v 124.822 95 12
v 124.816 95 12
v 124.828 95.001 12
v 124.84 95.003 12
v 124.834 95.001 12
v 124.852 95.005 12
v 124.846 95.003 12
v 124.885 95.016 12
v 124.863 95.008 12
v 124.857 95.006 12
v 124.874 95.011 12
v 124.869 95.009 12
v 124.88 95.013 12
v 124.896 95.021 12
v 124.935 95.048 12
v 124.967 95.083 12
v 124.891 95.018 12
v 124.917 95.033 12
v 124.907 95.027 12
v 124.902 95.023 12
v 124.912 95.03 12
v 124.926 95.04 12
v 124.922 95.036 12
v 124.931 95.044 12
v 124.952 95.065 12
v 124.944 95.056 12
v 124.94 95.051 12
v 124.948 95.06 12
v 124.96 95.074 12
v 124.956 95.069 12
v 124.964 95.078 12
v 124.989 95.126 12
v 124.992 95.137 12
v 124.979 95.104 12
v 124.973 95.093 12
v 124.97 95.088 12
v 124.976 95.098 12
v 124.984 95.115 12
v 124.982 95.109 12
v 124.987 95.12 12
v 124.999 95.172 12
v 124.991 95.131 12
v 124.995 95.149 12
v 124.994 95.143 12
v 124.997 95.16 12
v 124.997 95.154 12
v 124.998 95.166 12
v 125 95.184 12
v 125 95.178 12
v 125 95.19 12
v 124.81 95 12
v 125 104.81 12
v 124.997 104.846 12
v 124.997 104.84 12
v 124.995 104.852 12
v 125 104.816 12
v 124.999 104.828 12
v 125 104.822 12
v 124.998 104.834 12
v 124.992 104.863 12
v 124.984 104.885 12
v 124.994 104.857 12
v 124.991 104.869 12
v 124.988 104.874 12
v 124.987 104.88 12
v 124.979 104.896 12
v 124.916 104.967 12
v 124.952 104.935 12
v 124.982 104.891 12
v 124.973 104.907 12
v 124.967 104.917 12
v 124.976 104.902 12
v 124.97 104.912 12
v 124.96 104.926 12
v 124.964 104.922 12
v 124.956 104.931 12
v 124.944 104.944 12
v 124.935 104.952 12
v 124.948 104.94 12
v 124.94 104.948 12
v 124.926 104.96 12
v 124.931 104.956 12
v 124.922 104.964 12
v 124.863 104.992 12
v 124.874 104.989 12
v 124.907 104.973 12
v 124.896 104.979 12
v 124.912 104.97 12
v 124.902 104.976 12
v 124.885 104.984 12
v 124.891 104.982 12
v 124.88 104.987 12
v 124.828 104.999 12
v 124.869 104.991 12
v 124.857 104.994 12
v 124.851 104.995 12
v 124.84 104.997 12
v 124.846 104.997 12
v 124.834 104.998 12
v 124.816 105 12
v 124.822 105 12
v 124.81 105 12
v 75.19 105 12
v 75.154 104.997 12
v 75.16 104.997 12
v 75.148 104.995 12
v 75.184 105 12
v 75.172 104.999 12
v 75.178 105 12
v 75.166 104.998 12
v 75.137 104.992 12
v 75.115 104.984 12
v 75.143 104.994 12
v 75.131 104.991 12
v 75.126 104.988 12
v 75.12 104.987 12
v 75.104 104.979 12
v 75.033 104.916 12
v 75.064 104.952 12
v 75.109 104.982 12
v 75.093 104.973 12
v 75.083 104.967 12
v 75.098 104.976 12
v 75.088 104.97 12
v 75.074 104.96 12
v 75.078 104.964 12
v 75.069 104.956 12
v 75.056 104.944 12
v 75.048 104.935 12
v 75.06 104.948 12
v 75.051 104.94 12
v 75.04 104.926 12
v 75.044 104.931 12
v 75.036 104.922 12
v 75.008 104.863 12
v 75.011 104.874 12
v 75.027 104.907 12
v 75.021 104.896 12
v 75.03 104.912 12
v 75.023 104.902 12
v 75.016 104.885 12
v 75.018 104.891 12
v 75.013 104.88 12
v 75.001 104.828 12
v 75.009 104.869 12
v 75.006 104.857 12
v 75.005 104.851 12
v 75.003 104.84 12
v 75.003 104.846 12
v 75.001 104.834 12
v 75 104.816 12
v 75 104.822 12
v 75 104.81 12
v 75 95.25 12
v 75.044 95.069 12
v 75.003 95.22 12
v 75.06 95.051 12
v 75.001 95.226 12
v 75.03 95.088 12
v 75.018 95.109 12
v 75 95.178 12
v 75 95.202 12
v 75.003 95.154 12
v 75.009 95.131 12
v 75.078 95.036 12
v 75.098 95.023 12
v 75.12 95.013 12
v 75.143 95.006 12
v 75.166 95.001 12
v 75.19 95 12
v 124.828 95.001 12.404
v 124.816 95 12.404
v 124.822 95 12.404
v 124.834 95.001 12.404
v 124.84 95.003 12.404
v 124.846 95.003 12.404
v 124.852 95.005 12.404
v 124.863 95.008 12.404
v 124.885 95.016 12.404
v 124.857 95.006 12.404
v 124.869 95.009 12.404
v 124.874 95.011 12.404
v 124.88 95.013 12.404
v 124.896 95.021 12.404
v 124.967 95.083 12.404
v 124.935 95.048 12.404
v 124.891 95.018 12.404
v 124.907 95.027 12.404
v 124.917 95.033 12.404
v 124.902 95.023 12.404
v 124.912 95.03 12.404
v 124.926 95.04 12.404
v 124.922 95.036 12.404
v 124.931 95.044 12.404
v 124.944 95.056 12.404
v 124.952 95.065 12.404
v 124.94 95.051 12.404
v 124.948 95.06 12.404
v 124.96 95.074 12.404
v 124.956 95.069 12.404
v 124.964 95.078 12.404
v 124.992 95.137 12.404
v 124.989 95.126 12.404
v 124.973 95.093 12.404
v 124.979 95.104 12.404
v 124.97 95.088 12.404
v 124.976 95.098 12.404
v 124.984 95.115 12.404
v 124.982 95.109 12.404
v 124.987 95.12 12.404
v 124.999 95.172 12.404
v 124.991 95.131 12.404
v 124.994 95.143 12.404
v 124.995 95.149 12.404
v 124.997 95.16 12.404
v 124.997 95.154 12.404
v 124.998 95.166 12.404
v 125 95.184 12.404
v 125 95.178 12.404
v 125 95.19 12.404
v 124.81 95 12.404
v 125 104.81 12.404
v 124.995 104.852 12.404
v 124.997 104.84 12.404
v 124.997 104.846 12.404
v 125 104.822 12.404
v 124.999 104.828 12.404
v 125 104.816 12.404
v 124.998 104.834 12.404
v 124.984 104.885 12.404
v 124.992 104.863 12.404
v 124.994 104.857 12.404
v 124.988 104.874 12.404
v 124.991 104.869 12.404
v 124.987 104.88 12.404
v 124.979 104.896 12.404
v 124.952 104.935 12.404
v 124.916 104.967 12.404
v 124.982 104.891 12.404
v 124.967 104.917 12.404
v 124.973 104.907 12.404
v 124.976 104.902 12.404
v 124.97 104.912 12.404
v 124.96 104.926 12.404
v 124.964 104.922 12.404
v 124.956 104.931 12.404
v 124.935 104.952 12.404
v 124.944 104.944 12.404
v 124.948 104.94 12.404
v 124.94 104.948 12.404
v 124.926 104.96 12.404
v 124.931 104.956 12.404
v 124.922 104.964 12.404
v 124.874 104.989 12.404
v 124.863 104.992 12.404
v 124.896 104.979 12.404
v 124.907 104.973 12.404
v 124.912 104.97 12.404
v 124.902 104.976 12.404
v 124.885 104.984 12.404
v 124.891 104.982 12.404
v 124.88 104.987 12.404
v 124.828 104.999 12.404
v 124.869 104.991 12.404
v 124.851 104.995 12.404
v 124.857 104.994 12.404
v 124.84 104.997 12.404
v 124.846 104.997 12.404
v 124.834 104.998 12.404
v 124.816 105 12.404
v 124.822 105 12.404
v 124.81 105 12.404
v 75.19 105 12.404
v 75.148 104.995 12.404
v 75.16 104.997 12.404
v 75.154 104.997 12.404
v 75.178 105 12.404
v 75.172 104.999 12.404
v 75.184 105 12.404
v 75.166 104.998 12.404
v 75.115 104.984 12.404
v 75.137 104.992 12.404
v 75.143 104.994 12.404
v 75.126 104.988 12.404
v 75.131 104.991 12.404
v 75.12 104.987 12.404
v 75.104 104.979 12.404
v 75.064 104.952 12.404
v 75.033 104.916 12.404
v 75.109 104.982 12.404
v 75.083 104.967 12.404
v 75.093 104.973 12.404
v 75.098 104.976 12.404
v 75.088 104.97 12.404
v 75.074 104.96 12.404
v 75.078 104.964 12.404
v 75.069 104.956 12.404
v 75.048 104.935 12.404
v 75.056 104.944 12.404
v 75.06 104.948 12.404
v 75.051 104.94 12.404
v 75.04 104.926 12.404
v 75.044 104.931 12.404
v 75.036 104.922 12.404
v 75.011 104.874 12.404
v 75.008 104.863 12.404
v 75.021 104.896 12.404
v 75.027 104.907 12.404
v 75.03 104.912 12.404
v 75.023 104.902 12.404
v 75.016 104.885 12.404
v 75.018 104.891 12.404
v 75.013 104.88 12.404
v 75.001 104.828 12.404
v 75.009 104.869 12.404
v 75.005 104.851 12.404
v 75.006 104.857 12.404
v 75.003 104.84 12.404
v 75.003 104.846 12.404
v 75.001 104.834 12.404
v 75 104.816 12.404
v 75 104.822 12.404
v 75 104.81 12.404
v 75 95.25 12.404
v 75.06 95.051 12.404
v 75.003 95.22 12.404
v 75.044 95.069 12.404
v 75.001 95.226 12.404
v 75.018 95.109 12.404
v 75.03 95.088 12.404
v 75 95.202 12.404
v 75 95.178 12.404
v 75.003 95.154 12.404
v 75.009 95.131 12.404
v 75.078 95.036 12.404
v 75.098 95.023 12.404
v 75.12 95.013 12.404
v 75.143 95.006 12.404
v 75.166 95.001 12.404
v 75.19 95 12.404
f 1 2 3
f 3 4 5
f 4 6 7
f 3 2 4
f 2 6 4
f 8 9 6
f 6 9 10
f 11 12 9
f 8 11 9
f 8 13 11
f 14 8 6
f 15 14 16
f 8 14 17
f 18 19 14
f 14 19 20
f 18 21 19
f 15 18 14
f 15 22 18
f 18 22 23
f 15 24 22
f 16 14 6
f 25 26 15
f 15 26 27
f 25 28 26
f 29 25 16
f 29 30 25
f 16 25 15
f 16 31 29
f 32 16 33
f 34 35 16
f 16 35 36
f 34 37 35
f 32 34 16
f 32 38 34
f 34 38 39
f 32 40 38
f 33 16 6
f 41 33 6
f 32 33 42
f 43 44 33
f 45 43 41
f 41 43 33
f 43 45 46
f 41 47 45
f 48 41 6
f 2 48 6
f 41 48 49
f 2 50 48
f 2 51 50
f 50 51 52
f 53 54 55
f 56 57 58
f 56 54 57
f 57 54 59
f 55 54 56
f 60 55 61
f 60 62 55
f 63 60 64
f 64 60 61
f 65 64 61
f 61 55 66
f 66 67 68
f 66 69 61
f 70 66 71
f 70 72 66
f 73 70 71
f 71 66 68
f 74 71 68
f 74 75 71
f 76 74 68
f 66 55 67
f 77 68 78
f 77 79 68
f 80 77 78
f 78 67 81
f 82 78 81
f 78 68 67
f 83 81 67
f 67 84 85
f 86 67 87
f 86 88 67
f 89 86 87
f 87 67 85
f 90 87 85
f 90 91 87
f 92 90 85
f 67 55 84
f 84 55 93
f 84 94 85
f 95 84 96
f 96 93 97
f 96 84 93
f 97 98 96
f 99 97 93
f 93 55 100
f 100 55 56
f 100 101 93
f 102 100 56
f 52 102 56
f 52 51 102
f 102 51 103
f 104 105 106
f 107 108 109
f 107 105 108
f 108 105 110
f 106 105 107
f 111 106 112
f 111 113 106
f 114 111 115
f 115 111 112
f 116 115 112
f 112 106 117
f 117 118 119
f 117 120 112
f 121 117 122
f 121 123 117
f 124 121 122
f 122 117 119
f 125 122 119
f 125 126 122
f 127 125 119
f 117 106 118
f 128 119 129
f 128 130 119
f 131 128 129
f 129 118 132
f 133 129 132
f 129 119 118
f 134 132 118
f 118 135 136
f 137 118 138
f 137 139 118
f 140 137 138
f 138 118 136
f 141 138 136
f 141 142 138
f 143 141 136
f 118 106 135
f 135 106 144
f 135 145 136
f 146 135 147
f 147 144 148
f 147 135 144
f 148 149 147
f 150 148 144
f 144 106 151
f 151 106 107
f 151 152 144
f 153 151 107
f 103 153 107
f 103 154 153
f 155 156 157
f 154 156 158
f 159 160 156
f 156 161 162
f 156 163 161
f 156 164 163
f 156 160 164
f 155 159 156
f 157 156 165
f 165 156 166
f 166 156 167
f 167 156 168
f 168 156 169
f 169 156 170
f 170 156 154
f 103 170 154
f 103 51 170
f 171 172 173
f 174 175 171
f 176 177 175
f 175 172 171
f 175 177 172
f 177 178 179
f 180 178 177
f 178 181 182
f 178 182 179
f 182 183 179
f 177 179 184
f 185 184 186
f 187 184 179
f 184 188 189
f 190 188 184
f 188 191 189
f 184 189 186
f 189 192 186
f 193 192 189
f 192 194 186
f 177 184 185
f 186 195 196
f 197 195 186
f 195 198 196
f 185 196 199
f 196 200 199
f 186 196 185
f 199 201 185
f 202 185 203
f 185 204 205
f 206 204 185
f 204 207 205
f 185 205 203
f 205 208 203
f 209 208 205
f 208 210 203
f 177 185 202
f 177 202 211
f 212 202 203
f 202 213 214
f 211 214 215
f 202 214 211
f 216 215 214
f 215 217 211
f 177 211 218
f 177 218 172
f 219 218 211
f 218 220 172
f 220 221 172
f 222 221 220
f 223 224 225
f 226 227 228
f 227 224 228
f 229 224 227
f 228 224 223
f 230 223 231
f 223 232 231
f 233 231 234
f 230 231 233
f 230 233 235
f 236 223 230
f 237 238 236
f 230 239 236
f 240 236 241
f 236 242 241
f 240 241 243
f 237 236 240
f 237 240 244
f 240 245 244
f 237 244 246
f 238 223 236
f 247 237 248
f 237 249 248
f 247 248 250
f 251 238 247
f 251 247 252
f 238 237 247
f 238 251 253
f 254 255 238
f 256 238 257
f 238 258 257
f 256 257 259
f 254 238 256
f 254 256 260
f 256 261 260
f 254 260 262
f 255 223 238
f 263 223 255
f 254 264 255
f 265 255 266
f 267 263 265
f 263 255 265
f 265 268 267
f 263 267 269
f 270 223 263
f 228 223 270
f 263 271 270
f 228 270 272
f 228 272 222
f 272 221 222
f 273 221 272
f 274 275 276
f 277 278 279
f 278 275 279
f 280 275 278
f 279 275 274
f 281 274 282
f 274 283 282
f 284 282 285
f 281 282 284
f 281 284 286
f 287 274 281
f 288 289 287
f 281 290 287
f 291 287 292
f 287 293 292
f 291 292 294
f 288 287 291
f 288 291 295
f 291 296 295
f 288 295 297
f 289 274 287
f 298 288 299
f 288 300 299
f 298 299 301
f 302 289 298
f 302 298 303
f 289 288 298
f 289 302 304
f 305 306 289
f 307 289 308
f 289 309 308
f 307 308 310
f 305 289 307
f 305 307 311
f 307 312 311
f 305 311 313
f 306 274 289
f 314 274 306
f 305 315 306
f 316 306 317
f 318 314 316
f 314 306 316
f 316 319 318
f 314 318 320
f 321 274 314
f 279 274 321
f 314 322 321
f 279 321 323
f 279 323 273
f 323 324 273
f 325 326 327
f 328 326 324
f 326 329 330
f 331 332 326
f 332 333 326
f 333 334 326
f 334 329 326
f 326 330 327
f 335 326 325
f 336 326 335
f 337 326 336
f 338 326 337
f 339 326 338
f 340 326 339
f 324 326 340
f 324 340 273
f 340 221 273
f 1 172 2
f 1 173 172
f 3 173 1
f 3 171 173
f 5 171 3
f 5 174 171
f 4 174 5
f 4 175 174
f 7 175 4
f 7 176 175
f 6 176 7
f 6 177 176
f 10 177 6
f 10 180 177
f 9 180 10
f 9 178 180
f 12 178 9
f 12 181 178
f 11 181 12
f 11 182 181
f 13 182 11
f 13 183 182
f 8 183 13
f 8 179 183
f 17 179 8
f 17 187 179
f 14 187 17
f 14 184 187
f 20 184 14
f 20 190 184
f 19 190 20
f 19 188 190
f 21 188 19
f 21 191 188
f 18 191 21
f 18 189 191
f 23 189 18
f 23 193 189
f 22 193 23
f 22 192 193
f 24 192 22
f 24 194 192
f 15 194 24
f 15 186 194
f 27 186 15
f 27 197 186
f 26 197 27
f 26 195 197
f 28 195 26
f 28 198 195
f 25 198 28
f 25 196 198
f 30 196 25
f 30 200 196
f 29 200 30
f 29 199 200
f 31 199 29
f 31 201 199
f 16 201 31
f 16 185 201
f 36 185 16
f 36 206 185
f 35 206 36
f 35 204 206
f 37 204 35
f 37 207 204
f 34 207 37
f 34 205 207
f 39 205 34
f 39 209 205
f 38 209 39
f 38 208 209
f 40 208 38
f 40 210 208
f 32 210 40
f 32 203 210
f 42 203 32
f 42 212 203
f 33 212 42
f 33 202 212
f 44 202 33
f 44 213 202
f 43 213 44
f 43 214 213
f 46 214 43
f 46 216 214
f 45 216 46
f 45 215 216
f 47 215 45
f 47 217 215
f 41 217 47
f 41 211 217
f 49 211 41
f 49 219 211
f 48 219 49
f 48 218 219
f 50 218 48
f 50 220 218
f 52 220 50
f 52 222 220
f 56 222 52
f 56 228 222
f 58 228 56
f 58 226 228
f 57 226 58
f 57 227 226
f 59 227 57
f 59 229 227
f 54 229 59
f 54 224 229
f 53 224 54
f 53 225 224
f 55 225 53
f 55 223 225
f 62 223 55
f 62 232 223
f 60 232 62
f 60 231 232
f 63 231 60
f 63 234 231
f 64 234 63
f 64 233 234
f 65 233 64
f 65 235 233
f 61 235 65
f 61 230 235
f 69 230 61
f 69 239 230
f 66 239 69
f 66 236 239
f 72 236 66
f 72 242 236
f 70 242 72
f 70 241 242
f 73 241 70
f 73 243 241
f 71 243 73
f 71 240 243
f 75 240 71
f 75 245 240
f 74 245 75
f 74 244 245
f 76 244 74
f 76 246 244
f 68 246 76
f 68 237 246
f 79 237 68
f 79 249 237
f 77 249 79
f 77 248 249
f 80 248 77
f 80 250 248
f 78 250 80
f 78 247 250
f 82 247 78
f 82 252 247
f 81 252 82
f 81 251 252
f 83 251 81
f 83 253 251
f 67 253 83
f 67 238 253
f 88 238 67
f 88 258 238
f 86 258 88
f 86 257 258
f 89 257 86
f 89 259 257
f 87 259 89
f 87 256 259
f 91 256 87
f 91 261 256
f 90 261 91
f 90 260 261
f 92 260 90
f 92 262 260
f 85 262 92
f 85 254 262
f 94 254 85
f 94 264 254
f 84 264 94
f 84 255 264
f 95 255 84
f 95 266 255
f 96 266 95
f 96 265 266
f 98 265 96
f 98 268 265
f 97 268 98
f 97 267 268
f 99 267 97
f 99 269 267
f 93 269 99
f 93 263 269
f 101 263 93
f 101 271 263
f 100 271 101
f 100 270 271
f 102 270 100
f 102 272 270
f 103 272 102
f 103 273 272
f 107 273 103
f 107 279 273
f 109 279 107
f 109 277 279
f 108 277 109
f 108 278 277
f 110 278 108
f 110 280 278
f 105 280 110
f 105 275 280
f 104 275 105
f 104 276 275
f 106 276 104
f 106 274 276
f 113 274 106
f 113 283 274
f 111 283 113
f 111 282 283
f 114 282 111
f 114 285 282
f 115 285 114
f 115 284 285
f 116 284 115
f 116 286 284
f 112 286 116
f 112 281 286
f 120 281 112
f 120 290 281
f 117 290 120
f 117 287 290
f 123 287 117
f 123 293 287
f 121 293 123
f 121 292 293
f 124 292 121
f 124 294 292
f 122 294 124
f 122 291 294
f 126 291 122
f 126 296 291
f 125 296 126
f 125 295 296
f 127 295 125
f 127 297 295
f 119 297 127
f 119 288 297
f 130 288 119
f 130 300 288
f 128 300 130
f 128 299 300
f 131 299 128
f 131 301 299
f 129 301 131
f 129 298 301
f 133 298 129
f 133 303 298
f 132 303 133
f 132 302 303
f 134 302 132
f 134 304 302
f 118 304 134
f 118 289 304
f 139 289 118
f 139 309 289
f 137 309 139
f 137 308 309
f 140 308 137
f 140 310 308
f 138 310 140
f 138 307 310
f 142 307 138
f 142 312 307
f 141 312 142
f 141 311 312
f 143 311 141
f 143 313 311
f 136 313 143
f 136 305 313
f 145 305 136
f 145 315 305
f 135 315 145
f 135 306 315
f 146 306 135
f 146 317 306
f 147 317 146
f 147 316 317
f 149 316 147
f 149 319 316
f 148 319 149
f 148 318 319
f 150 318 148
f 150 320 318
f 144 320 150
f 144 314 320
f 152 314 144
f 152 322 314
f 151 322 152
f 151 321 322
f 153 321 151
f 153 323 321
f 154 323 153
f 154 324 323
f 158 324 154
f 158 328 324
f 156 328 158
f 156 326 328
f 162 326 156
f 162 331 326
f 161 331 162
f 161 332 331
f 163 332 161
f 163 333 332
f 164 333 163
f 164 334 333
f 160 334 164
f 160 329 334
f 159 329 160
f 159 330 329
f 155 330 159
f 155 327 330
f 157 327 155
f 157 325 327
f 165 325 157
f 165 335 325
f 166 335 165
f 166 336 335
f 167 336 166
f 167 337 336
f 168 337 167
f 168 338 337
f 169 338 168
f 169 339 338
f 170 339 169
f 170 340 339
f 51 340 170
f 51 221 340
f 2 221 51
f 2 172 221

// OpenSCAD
module drawBasicShape(x1, y1, x2, y2, width)
{
	length = sqrt((x1-x2)*(x1-x2) + (y1-y2)*(y1-y2));
	if (width!=0.0) {
		square(size = [width, length], center = false);
		translate([width/2.0, 0, 0]) circle(d=width);
		translate([width/2.0, length, 0]) circle(d=width);
	}
}

module translateAndRotate(x1, y1, x2, y2, width)
{
	if (width != 0.0) {
		angle = atan((y2-y1)/(x2-x1)) +270;
		if (x2>=x1) {
			translate([x1, y1, 0.0]) rotate([0.0, 0.0, angle]) translate([-width/2.0, 0.0, 0.0]) scale([1.0, 1.0, 1.0]) drawBasicShape(x1, y1, x2, y2, width);
		}
		else {
			translate([x1, y1, 0.0]) rotate([0.0, 0.0, angle+180]) translate([-width/2.0, 0.0, 0.0]) scale([1.0, 1.0, 1.0]) drawBasicShape(x1, y1, x2, y2, width);		}
	}
}

$fn=50;

points29 = [
[75.77800000, 95.77800000, 0.00000000],
[124.22200000, 95.77800000, 0.37999548],
[124.22200000, 104.22200000, 0.37997788],
[75.77800000, 104.22200000, 0.37999672],
[75.77800000, 95.83800000, 0.37997423],
[75.48400000, 95.48400000, 0.00000000],
[124.51600000, 95.48400000, 0.37999868],
[124.51600000, 104.51600000, 0.37998977],
[75.48400000, 104.51600000, 0.37999746],
[75.48400000, 95.54400000, 0.37999314],
[75.19000000, 95.19000000, 0.00000000],
[124.81000000, 95.19000000, 0.37999939],
[124.81000000, 104.81000000, 0.38000021],
[75.19000000, 104.81000000, 0.38000060],
[75.19000000, 95.25000000, 0.37999715],
[75.53600000, 95.39000000, 0.00000000],
[76.11100000, 95.94600000, 0.00000000],
[75.94600000, 96.11100000, 0.37961375],
[75.94600000, 96.52800000, 0.38001190],
[76.52800000, 95.94600000, 0.37989934],
[76.94500000, 95.94600000, 0.38001190],
[75.94600000, 96.94500000, 0.37998907],
[75.94600000, 97.36200000, 0.38001190],
[77.36200000, 95.94600000, 0.37999592],
[77.77900000, 95.94600000, 0.38001190],
[75.94600000, 97.77900000, 0.37999966],
[75.94600000, 98.19600000, 0.38001190],
[78.19600000, 95.94600000, 0.38002091],
[78.61300000, 95.94600000, 0.38001190],
[75.94600000, 98.61300000, 0.38001957],
[75.94600000, 99.03000000, 0.38001190],
[79.03000000, 95.94600000, 0.38001859],
[79.44700000, 95.94600000, 0.38001190],
[75.94600000, 99.44700000, 0.38002999],
[75.94600000, 99.86400000, 0.38001190],
[79.86400000, 95.94600000, 0.38002811],
[80.28100000, 95.94600000, 0.38001190],
[75.94600000, 100.28100000, 0.38002660],
[75.94600000, 100.69800000, 0.38001190],
[80.69800000, 95.94600000, 0.38002534],
[81.11500000, 95.94600000, 0.38015610],
[75.94600000, 101.11500000, 0.38002430],
[75.94600000, 101.53300000, 0.37945200],
[81.53300000, 95.94600000, 0.37997836],
[81.95000000, 95.94600000, 0.38001190],
[75.94600000, 101.95000000, 0.37998072],
[75.94600000, 102.36700000, 0.38001190],
[82.36700000, 95.94600000, 0.37998939],
[82.78400000, 95.94600000, 0.38001190],
[75.94600000, 102.78400000, 0.37999079],
[75.94600000, 103.20100000, 0.38015610],
[83.20100000, 95.94600000, 0.37999203],
[83.61800000, 95.94600000, 0.38001190],
[75.94600000, 103.61800000, 0.37999868],
[75.95600000, 104.02400000, 0.38048727],
[84.03500000, 95.94600000, 0.37999749],
[84.45200000, 95.94600000, 0.38015610],
[76.34400000, 104.05400000, 0.38000229],
[76.76100000, 104.05400000, 0.38001190],
[84.86900000, 95.94600000, 0.38000754],
[85.28600000, 95.94600000, 0.38001190],
[77.17800000, 104.05400000, 0.38000229],
[77.59500000, 104.05400000, 0.38001190],
[85.70300000, 95.94600000, 0.38000754],
[86.12000000, 95.94600000, 0.38001190],
[78.01200000, 104.05400000, 0.38000229],
[78.42900000, 104.05400000, 0.38015610],
[86.53700000, 95.94600000, 0.38000229],
[86.95400000, 95.94600000, 0.38001190],
[78.84600000, 104.05400000, 0.38000754],
[79.26300000, 104.05400000, 0.38001190],
[87.37100000, 95.94600000, 0.38000229],
[87.78900000, 95.94600000, 0.37930814],
[79.68000000, 104.05400000, 0.37998940],
[80.09700000, 104.05400000, 0.38001190],
[88.20600000, 95.94600000, 0.37998415],
[88.62300000, 95.94600000, 0.38015610],
[80.51500000, 104.05400000, 0.38000229],
[80.93200000, 104.05400000, 0.38001190],
[89.04000000, 95.94600000, 0.38000754],
[89.45700000, 95.94600000, 0.38001190],
[81.34900000, 104.05400000, 0.38000229],
[81.76600000, 104.05400000, 0.38001190],
[89.87400000, 95.94600000, 0.38000754],
[90.29100000, 95.94600000, 0.38001190],
[82.18300000, 104.05400000, 0.38000229],
[82.60000000, 104.05400000, 0.38015610],
[90.70800000, 95.94600000, 0.38000229],
[91.12500000, 95.94600000, 0.38001190],
[83.01700000, 104.05400000, 0.38000754],
[83.43400000, 104.05400000, 0.38001190],
[91.54200000, 95.94600000, 0.38000229],
[91.95900000, 95.94600000, 0.38001190],
[83.85100000, 104.05400000, 0.38000754],
[84.26800000, 104.05400000, 0.38001190],
[92.37600000, 95.94600000, 0.38000229],
[92.79300000, 95.94600000, 0.38015610],
[84.68500000, 104.05400000, 0.38000229],
[85.10200000, 104.05400000, 0.38001190],
[93.21000000, 95.94600000, 0.38000754],
[93.62700000, 95.94600000, 0.38001190],
[85.51900000, 104.05400000, 0.38000229],
[85.93600000, 104.05400000, 0.38001190],
[94.04400000, 95.94600000, 0.38000754],
[94.46200000, 95.94600000, 0.37930814],
[86.35300000, 104.05400000, 0.37998415],
[86.77000000, 104.05400000, 0.38015610],
[94.87900000, 95.94600000, 0.37998415],
[95.29600000, 95.94600000, 0.38001190],
[87.18800000, 104.05400000, 0.38000229],
[87.60500000, 104.05400000, 0.38015610],
[95.71300000, 95.94600000, 0.38000229],
[96.13000000, 95.94600000, 0.38001190],
[88.02200000, 104.05400000, 0.38000754],
[88.43900000, 104.05400000, 0.38001190],
[96.54700000, 95.94600000, 0.38000229],
[96.96400000, 95.94600000, 0.38015610],
[88.85600000, 104.05400000, 0.38000229],
[89.27300000, 104.05400000, 0.38001190],
[97.38100000, 95.94600000, 0.38000229],
[97.79800000, 95.94600000, 0.38015610],
[89.69000000, 104.05400000, 0.38000229],
[90.10700000, 104.05400000, 0.38001190],
[98.21500000, 95.94600000, 0.38000754],
[98.63200000, 95.94600000, 0.38001190],
[90.52400000, 104.05400000, 0.38000229],
[90.94100000, 104.05400000, 0.38001190],
[99.04900000, 95.94600000, 0.38000754],
[99.46600000, 95.94600000, 0.38001190],
[91.35800000, 104.05400000, 0.38000229],
[91.77500000, 104.05400000, 0.38015610],
[99.88300000, 95.94600000, 0.38000229],
[100.30000000, 95.94600000, 0.38001190],
[92.19200000, 104.05400000, 0.38000754],
[92.60900000, 104.05400000, 0.38001190],
[100.71800000, 95.94600000, 0.37998415],
[101.13500000, 95.94600000, 0.38001190],
[93.02600000, 104.05400000, 0.37998940],
[93.44400000, 104.05400000, 0.37930814],
[101.55200000, 95.94600000, 0.38000229],
[101.96900000, 95.94600000, 0.38015610],
[93.86100000, 104.05400000, 0.38000229],
[94.27800000, 104.05400000, 0.38001190],
[102.38600000, 95.94600000, 0.38000754],
[102.80300000, 95.94600000, 0.38001190],
[94.69500000, 104.05400000, 0.38000229],
[95.11200000, 104.05400000, 0.38001190],
[103.22000000, 95.94600000, 0.38000754],
[103.63700000, 95.94600000, 0.38001190],
[95.52900000, 104.05400000, 0.38000229],
[95.94600000, 104.05400000, 0.38015610],
[104.05400000, 95.94600000, 0.38000229],
[104.47100000, 95.94600000, 0.38001190],
[96.36300000, 104.05400000, 0.38000754],
[96.78000000, 104.05400000, 0.38001190],
[104.88800000, 95.94600000, 0.38000229],
[105.30500000, 95.94600000, 0.38015610],
[97.19700000, 104.05400000, 0.38000229],
[97.61400000, 104.05400000, 0.38001190],
[105.72200000, 95.94600000, 0.38000229],
[106.13900000, 95.94600000, 0.38015610],
[98.03100000, 104.05400000, 0.38000229],
[98.44800000, 104.05400000, 0.38001190],
[106.55600000, 95.94600000, 0.38000754],
[106.97300000, 95.94600000, 0.38001190],
[98.86500000, 104.05400000, 0.38000229],
[99.28200000, 104.05400000, 0.38015610],
[107.39100000, 95.94600000, 0.37998415],
[107.80800000, 95.94600000, 0.38001190],
[99.69900000, 104.05400000, 0.37998940],
[100.11700000, 104.05400000, 0.37930814],
[108.22500000, 95.94600000, 0.38000229],
[108.64200000, 95.94600000, 0.38001190],
[100.53400000, 104.05400000, 0.38000754],
[100.95100000, 104.05400000, 0.38001190],
[109.05900000, 95.94600000, 0.38000229],
[109.47600000, 95.94600000, 0.38015610],
[101.36800000, 104.05400000, 0.38000229],
[101.78500000, 104.05400000, 0.38001190],
[109.89300000, 95.94600000, 0.38000229],
[110.31000000, 95.94600000, 0.38015610],
[102.20200000, 104.05400000, 0.38000229],
[102.61900000, 104.05400000, 0.38001190],
[110.72700000, 95.94600000, 0.38000754],
[111.14400000, 95.94600000, 0.38001190],
[103.03600000, 104.05400000, 0.38000229],
[103.45300000, 104.05400000, 0.38015610],
[111.56100000, 95.94600000, 0.38000229],
[111.97800000, 95.94600000, 0.38001190],
[103.87000000, 104.05400000, 0.38000229],
[104.28700000, 104.05400000, 0.38015610],
[112.39500000, 95.94600000, 0.38000229],
[112.81200000, 95.94600000, 0.38001190],
[104.70400000, 104.05400000, 0.38000754],
[105.12100000, 104.05400000, 0.38001190],
[113.22900000, 95.94600000, 0.38000229],
[113.64700000, 95.94600000, 0.37930814],
[105.53800000, 104.05400000, 0.37998940],
[105.95500000, 104.05400000, 0.38001190],
[114.06400000, 95.94600000, 0.37998415],
[114.48100000, 95.94600000, 0.38015610],
[106.37300000, 104.05400000, 0.38000229],
[106.79000000, 104.05400000, 0.38001190],
[114.89800000, 95.94600000, 0.38000754],
[115.31500000, 95.94600000, 0.38001190],
[107.20700000, 104.05400000, 0.38000229],
[107.62400000, 104.05400000, 0.38001190],
[115.73200000, 95.94600000, 0.38000754],
[116.14900000, 95.94600000, 0.38001190],
[108.04100000, 104.05400000, 0.38000229],
[108.45800000, 104.05400000, 0.38015610],
[116.56600000, 95.94600000, 0.38000229],
[116.98300000, 95.94600000, 0.38001190],
[108.87500000, 104.05400000, 0.38000754],
[109.29200000, 104.05400000, 0.38001190],
[117.40000000, 95.94600000, 0.38000229],
[117.81700000, 95.94600000, 0.38001190],
[109.70900000, 104.05400000, 0.38000754],
[110.12600000, 104.05400000, 0.38001190],
[118.23400000, 95.94600000, 0.38000229],
[118.65100000, 95.94600000, 0.38015610],
[110.54300000, 104.05400000, 0.38000229],
[110.96000000, 104.05400000, 0.38001190],
[119.06800000, 95.94600000, 0.38000754],
[119.48500000, 95.94600000, 0.38001190],
[111.37700000, 104.05400000, 0.38000229],
[111.79400000, 104.05400000, 0.38001190],
[119.90200000, 95.94600000, 0.38000754],
[120.32000000, 95.94600000, 0.37930814],
[112.21100000, 104.05400000, 0.37998415],
[112.62900000, 104.05400000, 0.37945200],
[120.73700000, 95.94600000, 0.38000229],
[121.15400000, 95.94600000, 0.38001190],
[113.04600000, 104.05400000, 0.38000754],
[113.46300000, 104.05400000, 0.38001190],
[121.57100000, 95.94600000, 0.38000229],
[121.98800000, 95.94600000, 0.38001190],
[113.88000000, 104.05400000, 0.38000754],
[114.29700000, 104.05400000, 0.38001190],
[122.40500000, 95.94600000, 0.38000229],
[122.82200000, 95.94600000, 0.38015610],
[114.71400000, 104.05400000, 0.38000229],
[115.13100000, 104.05400000, 0.38001190],
[123.23900000, 95.94600000, 0.38000754],
[123.65600000, 95.94600000, 0.38001190],
[115.54800000, 104.05400000, 0.38000229],
[115.96500000, 104.05400000, 0.38001190],
[124.04400000, 95.97500000, 0.37998455],
[124.05400000, 96.38200000, 0.37976376],
[116.38200000, 104.05400000, 0.37999868],
[116.79900000, 104.05400000, 0.38001190],
[124.05400000, 96.79900000, 0.37999789],
[124.05400000, 97.21600000, 0.38001190],
[117.21600000, 104.05400000, 0.37999701],
[117.63300000, 104.05400000, 0.38001190],
[124.05400000, 97.63300000, 0.37998939],
[124.05400000, 98.05000000, 0.38001190],
[118.05000000, 104.05400000, 0.37998780],
[118.46700000, 104.05400000, 0.38001190],
[124.05400000, 98.46700000, 0.37997836],
[124.05400000, 98.88400000, 0.38015610],
[118.88400000, 104.05400000, 0.37997562],
[119.30200000, 104.05400000, 0.37930814],
[124.05400000, 99.30200000, 0.38003429],
[124.05400000, 99.71900000, 0.38001190],
[119.71900000, 104.05400000, 0.38002660],
[120.13600000, 104.05400000, 0.38015610],
[124.05400000, 100.13600000, 0.38002811],
[124.05400000, 100.55300000, 0.38001190],
[120.55300000, 104.05400000, 0.38002999],
[120.97000000, 104.05400000, 0.38001190],
[124.05400000, 100.97000000, 0.38001859],
[124.05400000, 101.38700000, 0.38001190],
[121.38700000, 104.05400000, 0.38003551],
[121.80400000, 104.05400000, 0.38001190],
[124.05400000, 101.80400000, 0.38002091],
[124.05400000, 102.22100000, 0.38001190],
[122.22100000, 104.05400000, 0.37999966],
[122.63800000, 104.05400000, 0.38001190],
[124.05400000, 102.63800000, 0.38002595],
[124.05400000, 103.05500000, 0.38001190],
[123.05500000, 104.05400000, 0.37998907],
[123.47200000, 104.05400000, 0.38001190],
[124.05400000, 103.47200000, 0.37989934],
[124.05400000, 103.88900000, 0.38015610],
[123.88900000, 104.05400000, 0.37961375],
];

translate([0.0, 0.0, 12.00000000]) {
	linear_extrude(height = 0.40400000, center = false, convexity = 10, twist = 0) {
		union() {
			for( i=[0:len(points29)-2] ){ 
				x1 = points29[i][0];
				y1 = points29[i][1];
				x2 = points29[i+1][0];
				y2 = points29[i+1][1];
				width = points29[i+1][2];
				translateAndRotate(x1, y1, x2, y2, width);
			}
		}
	}
}
